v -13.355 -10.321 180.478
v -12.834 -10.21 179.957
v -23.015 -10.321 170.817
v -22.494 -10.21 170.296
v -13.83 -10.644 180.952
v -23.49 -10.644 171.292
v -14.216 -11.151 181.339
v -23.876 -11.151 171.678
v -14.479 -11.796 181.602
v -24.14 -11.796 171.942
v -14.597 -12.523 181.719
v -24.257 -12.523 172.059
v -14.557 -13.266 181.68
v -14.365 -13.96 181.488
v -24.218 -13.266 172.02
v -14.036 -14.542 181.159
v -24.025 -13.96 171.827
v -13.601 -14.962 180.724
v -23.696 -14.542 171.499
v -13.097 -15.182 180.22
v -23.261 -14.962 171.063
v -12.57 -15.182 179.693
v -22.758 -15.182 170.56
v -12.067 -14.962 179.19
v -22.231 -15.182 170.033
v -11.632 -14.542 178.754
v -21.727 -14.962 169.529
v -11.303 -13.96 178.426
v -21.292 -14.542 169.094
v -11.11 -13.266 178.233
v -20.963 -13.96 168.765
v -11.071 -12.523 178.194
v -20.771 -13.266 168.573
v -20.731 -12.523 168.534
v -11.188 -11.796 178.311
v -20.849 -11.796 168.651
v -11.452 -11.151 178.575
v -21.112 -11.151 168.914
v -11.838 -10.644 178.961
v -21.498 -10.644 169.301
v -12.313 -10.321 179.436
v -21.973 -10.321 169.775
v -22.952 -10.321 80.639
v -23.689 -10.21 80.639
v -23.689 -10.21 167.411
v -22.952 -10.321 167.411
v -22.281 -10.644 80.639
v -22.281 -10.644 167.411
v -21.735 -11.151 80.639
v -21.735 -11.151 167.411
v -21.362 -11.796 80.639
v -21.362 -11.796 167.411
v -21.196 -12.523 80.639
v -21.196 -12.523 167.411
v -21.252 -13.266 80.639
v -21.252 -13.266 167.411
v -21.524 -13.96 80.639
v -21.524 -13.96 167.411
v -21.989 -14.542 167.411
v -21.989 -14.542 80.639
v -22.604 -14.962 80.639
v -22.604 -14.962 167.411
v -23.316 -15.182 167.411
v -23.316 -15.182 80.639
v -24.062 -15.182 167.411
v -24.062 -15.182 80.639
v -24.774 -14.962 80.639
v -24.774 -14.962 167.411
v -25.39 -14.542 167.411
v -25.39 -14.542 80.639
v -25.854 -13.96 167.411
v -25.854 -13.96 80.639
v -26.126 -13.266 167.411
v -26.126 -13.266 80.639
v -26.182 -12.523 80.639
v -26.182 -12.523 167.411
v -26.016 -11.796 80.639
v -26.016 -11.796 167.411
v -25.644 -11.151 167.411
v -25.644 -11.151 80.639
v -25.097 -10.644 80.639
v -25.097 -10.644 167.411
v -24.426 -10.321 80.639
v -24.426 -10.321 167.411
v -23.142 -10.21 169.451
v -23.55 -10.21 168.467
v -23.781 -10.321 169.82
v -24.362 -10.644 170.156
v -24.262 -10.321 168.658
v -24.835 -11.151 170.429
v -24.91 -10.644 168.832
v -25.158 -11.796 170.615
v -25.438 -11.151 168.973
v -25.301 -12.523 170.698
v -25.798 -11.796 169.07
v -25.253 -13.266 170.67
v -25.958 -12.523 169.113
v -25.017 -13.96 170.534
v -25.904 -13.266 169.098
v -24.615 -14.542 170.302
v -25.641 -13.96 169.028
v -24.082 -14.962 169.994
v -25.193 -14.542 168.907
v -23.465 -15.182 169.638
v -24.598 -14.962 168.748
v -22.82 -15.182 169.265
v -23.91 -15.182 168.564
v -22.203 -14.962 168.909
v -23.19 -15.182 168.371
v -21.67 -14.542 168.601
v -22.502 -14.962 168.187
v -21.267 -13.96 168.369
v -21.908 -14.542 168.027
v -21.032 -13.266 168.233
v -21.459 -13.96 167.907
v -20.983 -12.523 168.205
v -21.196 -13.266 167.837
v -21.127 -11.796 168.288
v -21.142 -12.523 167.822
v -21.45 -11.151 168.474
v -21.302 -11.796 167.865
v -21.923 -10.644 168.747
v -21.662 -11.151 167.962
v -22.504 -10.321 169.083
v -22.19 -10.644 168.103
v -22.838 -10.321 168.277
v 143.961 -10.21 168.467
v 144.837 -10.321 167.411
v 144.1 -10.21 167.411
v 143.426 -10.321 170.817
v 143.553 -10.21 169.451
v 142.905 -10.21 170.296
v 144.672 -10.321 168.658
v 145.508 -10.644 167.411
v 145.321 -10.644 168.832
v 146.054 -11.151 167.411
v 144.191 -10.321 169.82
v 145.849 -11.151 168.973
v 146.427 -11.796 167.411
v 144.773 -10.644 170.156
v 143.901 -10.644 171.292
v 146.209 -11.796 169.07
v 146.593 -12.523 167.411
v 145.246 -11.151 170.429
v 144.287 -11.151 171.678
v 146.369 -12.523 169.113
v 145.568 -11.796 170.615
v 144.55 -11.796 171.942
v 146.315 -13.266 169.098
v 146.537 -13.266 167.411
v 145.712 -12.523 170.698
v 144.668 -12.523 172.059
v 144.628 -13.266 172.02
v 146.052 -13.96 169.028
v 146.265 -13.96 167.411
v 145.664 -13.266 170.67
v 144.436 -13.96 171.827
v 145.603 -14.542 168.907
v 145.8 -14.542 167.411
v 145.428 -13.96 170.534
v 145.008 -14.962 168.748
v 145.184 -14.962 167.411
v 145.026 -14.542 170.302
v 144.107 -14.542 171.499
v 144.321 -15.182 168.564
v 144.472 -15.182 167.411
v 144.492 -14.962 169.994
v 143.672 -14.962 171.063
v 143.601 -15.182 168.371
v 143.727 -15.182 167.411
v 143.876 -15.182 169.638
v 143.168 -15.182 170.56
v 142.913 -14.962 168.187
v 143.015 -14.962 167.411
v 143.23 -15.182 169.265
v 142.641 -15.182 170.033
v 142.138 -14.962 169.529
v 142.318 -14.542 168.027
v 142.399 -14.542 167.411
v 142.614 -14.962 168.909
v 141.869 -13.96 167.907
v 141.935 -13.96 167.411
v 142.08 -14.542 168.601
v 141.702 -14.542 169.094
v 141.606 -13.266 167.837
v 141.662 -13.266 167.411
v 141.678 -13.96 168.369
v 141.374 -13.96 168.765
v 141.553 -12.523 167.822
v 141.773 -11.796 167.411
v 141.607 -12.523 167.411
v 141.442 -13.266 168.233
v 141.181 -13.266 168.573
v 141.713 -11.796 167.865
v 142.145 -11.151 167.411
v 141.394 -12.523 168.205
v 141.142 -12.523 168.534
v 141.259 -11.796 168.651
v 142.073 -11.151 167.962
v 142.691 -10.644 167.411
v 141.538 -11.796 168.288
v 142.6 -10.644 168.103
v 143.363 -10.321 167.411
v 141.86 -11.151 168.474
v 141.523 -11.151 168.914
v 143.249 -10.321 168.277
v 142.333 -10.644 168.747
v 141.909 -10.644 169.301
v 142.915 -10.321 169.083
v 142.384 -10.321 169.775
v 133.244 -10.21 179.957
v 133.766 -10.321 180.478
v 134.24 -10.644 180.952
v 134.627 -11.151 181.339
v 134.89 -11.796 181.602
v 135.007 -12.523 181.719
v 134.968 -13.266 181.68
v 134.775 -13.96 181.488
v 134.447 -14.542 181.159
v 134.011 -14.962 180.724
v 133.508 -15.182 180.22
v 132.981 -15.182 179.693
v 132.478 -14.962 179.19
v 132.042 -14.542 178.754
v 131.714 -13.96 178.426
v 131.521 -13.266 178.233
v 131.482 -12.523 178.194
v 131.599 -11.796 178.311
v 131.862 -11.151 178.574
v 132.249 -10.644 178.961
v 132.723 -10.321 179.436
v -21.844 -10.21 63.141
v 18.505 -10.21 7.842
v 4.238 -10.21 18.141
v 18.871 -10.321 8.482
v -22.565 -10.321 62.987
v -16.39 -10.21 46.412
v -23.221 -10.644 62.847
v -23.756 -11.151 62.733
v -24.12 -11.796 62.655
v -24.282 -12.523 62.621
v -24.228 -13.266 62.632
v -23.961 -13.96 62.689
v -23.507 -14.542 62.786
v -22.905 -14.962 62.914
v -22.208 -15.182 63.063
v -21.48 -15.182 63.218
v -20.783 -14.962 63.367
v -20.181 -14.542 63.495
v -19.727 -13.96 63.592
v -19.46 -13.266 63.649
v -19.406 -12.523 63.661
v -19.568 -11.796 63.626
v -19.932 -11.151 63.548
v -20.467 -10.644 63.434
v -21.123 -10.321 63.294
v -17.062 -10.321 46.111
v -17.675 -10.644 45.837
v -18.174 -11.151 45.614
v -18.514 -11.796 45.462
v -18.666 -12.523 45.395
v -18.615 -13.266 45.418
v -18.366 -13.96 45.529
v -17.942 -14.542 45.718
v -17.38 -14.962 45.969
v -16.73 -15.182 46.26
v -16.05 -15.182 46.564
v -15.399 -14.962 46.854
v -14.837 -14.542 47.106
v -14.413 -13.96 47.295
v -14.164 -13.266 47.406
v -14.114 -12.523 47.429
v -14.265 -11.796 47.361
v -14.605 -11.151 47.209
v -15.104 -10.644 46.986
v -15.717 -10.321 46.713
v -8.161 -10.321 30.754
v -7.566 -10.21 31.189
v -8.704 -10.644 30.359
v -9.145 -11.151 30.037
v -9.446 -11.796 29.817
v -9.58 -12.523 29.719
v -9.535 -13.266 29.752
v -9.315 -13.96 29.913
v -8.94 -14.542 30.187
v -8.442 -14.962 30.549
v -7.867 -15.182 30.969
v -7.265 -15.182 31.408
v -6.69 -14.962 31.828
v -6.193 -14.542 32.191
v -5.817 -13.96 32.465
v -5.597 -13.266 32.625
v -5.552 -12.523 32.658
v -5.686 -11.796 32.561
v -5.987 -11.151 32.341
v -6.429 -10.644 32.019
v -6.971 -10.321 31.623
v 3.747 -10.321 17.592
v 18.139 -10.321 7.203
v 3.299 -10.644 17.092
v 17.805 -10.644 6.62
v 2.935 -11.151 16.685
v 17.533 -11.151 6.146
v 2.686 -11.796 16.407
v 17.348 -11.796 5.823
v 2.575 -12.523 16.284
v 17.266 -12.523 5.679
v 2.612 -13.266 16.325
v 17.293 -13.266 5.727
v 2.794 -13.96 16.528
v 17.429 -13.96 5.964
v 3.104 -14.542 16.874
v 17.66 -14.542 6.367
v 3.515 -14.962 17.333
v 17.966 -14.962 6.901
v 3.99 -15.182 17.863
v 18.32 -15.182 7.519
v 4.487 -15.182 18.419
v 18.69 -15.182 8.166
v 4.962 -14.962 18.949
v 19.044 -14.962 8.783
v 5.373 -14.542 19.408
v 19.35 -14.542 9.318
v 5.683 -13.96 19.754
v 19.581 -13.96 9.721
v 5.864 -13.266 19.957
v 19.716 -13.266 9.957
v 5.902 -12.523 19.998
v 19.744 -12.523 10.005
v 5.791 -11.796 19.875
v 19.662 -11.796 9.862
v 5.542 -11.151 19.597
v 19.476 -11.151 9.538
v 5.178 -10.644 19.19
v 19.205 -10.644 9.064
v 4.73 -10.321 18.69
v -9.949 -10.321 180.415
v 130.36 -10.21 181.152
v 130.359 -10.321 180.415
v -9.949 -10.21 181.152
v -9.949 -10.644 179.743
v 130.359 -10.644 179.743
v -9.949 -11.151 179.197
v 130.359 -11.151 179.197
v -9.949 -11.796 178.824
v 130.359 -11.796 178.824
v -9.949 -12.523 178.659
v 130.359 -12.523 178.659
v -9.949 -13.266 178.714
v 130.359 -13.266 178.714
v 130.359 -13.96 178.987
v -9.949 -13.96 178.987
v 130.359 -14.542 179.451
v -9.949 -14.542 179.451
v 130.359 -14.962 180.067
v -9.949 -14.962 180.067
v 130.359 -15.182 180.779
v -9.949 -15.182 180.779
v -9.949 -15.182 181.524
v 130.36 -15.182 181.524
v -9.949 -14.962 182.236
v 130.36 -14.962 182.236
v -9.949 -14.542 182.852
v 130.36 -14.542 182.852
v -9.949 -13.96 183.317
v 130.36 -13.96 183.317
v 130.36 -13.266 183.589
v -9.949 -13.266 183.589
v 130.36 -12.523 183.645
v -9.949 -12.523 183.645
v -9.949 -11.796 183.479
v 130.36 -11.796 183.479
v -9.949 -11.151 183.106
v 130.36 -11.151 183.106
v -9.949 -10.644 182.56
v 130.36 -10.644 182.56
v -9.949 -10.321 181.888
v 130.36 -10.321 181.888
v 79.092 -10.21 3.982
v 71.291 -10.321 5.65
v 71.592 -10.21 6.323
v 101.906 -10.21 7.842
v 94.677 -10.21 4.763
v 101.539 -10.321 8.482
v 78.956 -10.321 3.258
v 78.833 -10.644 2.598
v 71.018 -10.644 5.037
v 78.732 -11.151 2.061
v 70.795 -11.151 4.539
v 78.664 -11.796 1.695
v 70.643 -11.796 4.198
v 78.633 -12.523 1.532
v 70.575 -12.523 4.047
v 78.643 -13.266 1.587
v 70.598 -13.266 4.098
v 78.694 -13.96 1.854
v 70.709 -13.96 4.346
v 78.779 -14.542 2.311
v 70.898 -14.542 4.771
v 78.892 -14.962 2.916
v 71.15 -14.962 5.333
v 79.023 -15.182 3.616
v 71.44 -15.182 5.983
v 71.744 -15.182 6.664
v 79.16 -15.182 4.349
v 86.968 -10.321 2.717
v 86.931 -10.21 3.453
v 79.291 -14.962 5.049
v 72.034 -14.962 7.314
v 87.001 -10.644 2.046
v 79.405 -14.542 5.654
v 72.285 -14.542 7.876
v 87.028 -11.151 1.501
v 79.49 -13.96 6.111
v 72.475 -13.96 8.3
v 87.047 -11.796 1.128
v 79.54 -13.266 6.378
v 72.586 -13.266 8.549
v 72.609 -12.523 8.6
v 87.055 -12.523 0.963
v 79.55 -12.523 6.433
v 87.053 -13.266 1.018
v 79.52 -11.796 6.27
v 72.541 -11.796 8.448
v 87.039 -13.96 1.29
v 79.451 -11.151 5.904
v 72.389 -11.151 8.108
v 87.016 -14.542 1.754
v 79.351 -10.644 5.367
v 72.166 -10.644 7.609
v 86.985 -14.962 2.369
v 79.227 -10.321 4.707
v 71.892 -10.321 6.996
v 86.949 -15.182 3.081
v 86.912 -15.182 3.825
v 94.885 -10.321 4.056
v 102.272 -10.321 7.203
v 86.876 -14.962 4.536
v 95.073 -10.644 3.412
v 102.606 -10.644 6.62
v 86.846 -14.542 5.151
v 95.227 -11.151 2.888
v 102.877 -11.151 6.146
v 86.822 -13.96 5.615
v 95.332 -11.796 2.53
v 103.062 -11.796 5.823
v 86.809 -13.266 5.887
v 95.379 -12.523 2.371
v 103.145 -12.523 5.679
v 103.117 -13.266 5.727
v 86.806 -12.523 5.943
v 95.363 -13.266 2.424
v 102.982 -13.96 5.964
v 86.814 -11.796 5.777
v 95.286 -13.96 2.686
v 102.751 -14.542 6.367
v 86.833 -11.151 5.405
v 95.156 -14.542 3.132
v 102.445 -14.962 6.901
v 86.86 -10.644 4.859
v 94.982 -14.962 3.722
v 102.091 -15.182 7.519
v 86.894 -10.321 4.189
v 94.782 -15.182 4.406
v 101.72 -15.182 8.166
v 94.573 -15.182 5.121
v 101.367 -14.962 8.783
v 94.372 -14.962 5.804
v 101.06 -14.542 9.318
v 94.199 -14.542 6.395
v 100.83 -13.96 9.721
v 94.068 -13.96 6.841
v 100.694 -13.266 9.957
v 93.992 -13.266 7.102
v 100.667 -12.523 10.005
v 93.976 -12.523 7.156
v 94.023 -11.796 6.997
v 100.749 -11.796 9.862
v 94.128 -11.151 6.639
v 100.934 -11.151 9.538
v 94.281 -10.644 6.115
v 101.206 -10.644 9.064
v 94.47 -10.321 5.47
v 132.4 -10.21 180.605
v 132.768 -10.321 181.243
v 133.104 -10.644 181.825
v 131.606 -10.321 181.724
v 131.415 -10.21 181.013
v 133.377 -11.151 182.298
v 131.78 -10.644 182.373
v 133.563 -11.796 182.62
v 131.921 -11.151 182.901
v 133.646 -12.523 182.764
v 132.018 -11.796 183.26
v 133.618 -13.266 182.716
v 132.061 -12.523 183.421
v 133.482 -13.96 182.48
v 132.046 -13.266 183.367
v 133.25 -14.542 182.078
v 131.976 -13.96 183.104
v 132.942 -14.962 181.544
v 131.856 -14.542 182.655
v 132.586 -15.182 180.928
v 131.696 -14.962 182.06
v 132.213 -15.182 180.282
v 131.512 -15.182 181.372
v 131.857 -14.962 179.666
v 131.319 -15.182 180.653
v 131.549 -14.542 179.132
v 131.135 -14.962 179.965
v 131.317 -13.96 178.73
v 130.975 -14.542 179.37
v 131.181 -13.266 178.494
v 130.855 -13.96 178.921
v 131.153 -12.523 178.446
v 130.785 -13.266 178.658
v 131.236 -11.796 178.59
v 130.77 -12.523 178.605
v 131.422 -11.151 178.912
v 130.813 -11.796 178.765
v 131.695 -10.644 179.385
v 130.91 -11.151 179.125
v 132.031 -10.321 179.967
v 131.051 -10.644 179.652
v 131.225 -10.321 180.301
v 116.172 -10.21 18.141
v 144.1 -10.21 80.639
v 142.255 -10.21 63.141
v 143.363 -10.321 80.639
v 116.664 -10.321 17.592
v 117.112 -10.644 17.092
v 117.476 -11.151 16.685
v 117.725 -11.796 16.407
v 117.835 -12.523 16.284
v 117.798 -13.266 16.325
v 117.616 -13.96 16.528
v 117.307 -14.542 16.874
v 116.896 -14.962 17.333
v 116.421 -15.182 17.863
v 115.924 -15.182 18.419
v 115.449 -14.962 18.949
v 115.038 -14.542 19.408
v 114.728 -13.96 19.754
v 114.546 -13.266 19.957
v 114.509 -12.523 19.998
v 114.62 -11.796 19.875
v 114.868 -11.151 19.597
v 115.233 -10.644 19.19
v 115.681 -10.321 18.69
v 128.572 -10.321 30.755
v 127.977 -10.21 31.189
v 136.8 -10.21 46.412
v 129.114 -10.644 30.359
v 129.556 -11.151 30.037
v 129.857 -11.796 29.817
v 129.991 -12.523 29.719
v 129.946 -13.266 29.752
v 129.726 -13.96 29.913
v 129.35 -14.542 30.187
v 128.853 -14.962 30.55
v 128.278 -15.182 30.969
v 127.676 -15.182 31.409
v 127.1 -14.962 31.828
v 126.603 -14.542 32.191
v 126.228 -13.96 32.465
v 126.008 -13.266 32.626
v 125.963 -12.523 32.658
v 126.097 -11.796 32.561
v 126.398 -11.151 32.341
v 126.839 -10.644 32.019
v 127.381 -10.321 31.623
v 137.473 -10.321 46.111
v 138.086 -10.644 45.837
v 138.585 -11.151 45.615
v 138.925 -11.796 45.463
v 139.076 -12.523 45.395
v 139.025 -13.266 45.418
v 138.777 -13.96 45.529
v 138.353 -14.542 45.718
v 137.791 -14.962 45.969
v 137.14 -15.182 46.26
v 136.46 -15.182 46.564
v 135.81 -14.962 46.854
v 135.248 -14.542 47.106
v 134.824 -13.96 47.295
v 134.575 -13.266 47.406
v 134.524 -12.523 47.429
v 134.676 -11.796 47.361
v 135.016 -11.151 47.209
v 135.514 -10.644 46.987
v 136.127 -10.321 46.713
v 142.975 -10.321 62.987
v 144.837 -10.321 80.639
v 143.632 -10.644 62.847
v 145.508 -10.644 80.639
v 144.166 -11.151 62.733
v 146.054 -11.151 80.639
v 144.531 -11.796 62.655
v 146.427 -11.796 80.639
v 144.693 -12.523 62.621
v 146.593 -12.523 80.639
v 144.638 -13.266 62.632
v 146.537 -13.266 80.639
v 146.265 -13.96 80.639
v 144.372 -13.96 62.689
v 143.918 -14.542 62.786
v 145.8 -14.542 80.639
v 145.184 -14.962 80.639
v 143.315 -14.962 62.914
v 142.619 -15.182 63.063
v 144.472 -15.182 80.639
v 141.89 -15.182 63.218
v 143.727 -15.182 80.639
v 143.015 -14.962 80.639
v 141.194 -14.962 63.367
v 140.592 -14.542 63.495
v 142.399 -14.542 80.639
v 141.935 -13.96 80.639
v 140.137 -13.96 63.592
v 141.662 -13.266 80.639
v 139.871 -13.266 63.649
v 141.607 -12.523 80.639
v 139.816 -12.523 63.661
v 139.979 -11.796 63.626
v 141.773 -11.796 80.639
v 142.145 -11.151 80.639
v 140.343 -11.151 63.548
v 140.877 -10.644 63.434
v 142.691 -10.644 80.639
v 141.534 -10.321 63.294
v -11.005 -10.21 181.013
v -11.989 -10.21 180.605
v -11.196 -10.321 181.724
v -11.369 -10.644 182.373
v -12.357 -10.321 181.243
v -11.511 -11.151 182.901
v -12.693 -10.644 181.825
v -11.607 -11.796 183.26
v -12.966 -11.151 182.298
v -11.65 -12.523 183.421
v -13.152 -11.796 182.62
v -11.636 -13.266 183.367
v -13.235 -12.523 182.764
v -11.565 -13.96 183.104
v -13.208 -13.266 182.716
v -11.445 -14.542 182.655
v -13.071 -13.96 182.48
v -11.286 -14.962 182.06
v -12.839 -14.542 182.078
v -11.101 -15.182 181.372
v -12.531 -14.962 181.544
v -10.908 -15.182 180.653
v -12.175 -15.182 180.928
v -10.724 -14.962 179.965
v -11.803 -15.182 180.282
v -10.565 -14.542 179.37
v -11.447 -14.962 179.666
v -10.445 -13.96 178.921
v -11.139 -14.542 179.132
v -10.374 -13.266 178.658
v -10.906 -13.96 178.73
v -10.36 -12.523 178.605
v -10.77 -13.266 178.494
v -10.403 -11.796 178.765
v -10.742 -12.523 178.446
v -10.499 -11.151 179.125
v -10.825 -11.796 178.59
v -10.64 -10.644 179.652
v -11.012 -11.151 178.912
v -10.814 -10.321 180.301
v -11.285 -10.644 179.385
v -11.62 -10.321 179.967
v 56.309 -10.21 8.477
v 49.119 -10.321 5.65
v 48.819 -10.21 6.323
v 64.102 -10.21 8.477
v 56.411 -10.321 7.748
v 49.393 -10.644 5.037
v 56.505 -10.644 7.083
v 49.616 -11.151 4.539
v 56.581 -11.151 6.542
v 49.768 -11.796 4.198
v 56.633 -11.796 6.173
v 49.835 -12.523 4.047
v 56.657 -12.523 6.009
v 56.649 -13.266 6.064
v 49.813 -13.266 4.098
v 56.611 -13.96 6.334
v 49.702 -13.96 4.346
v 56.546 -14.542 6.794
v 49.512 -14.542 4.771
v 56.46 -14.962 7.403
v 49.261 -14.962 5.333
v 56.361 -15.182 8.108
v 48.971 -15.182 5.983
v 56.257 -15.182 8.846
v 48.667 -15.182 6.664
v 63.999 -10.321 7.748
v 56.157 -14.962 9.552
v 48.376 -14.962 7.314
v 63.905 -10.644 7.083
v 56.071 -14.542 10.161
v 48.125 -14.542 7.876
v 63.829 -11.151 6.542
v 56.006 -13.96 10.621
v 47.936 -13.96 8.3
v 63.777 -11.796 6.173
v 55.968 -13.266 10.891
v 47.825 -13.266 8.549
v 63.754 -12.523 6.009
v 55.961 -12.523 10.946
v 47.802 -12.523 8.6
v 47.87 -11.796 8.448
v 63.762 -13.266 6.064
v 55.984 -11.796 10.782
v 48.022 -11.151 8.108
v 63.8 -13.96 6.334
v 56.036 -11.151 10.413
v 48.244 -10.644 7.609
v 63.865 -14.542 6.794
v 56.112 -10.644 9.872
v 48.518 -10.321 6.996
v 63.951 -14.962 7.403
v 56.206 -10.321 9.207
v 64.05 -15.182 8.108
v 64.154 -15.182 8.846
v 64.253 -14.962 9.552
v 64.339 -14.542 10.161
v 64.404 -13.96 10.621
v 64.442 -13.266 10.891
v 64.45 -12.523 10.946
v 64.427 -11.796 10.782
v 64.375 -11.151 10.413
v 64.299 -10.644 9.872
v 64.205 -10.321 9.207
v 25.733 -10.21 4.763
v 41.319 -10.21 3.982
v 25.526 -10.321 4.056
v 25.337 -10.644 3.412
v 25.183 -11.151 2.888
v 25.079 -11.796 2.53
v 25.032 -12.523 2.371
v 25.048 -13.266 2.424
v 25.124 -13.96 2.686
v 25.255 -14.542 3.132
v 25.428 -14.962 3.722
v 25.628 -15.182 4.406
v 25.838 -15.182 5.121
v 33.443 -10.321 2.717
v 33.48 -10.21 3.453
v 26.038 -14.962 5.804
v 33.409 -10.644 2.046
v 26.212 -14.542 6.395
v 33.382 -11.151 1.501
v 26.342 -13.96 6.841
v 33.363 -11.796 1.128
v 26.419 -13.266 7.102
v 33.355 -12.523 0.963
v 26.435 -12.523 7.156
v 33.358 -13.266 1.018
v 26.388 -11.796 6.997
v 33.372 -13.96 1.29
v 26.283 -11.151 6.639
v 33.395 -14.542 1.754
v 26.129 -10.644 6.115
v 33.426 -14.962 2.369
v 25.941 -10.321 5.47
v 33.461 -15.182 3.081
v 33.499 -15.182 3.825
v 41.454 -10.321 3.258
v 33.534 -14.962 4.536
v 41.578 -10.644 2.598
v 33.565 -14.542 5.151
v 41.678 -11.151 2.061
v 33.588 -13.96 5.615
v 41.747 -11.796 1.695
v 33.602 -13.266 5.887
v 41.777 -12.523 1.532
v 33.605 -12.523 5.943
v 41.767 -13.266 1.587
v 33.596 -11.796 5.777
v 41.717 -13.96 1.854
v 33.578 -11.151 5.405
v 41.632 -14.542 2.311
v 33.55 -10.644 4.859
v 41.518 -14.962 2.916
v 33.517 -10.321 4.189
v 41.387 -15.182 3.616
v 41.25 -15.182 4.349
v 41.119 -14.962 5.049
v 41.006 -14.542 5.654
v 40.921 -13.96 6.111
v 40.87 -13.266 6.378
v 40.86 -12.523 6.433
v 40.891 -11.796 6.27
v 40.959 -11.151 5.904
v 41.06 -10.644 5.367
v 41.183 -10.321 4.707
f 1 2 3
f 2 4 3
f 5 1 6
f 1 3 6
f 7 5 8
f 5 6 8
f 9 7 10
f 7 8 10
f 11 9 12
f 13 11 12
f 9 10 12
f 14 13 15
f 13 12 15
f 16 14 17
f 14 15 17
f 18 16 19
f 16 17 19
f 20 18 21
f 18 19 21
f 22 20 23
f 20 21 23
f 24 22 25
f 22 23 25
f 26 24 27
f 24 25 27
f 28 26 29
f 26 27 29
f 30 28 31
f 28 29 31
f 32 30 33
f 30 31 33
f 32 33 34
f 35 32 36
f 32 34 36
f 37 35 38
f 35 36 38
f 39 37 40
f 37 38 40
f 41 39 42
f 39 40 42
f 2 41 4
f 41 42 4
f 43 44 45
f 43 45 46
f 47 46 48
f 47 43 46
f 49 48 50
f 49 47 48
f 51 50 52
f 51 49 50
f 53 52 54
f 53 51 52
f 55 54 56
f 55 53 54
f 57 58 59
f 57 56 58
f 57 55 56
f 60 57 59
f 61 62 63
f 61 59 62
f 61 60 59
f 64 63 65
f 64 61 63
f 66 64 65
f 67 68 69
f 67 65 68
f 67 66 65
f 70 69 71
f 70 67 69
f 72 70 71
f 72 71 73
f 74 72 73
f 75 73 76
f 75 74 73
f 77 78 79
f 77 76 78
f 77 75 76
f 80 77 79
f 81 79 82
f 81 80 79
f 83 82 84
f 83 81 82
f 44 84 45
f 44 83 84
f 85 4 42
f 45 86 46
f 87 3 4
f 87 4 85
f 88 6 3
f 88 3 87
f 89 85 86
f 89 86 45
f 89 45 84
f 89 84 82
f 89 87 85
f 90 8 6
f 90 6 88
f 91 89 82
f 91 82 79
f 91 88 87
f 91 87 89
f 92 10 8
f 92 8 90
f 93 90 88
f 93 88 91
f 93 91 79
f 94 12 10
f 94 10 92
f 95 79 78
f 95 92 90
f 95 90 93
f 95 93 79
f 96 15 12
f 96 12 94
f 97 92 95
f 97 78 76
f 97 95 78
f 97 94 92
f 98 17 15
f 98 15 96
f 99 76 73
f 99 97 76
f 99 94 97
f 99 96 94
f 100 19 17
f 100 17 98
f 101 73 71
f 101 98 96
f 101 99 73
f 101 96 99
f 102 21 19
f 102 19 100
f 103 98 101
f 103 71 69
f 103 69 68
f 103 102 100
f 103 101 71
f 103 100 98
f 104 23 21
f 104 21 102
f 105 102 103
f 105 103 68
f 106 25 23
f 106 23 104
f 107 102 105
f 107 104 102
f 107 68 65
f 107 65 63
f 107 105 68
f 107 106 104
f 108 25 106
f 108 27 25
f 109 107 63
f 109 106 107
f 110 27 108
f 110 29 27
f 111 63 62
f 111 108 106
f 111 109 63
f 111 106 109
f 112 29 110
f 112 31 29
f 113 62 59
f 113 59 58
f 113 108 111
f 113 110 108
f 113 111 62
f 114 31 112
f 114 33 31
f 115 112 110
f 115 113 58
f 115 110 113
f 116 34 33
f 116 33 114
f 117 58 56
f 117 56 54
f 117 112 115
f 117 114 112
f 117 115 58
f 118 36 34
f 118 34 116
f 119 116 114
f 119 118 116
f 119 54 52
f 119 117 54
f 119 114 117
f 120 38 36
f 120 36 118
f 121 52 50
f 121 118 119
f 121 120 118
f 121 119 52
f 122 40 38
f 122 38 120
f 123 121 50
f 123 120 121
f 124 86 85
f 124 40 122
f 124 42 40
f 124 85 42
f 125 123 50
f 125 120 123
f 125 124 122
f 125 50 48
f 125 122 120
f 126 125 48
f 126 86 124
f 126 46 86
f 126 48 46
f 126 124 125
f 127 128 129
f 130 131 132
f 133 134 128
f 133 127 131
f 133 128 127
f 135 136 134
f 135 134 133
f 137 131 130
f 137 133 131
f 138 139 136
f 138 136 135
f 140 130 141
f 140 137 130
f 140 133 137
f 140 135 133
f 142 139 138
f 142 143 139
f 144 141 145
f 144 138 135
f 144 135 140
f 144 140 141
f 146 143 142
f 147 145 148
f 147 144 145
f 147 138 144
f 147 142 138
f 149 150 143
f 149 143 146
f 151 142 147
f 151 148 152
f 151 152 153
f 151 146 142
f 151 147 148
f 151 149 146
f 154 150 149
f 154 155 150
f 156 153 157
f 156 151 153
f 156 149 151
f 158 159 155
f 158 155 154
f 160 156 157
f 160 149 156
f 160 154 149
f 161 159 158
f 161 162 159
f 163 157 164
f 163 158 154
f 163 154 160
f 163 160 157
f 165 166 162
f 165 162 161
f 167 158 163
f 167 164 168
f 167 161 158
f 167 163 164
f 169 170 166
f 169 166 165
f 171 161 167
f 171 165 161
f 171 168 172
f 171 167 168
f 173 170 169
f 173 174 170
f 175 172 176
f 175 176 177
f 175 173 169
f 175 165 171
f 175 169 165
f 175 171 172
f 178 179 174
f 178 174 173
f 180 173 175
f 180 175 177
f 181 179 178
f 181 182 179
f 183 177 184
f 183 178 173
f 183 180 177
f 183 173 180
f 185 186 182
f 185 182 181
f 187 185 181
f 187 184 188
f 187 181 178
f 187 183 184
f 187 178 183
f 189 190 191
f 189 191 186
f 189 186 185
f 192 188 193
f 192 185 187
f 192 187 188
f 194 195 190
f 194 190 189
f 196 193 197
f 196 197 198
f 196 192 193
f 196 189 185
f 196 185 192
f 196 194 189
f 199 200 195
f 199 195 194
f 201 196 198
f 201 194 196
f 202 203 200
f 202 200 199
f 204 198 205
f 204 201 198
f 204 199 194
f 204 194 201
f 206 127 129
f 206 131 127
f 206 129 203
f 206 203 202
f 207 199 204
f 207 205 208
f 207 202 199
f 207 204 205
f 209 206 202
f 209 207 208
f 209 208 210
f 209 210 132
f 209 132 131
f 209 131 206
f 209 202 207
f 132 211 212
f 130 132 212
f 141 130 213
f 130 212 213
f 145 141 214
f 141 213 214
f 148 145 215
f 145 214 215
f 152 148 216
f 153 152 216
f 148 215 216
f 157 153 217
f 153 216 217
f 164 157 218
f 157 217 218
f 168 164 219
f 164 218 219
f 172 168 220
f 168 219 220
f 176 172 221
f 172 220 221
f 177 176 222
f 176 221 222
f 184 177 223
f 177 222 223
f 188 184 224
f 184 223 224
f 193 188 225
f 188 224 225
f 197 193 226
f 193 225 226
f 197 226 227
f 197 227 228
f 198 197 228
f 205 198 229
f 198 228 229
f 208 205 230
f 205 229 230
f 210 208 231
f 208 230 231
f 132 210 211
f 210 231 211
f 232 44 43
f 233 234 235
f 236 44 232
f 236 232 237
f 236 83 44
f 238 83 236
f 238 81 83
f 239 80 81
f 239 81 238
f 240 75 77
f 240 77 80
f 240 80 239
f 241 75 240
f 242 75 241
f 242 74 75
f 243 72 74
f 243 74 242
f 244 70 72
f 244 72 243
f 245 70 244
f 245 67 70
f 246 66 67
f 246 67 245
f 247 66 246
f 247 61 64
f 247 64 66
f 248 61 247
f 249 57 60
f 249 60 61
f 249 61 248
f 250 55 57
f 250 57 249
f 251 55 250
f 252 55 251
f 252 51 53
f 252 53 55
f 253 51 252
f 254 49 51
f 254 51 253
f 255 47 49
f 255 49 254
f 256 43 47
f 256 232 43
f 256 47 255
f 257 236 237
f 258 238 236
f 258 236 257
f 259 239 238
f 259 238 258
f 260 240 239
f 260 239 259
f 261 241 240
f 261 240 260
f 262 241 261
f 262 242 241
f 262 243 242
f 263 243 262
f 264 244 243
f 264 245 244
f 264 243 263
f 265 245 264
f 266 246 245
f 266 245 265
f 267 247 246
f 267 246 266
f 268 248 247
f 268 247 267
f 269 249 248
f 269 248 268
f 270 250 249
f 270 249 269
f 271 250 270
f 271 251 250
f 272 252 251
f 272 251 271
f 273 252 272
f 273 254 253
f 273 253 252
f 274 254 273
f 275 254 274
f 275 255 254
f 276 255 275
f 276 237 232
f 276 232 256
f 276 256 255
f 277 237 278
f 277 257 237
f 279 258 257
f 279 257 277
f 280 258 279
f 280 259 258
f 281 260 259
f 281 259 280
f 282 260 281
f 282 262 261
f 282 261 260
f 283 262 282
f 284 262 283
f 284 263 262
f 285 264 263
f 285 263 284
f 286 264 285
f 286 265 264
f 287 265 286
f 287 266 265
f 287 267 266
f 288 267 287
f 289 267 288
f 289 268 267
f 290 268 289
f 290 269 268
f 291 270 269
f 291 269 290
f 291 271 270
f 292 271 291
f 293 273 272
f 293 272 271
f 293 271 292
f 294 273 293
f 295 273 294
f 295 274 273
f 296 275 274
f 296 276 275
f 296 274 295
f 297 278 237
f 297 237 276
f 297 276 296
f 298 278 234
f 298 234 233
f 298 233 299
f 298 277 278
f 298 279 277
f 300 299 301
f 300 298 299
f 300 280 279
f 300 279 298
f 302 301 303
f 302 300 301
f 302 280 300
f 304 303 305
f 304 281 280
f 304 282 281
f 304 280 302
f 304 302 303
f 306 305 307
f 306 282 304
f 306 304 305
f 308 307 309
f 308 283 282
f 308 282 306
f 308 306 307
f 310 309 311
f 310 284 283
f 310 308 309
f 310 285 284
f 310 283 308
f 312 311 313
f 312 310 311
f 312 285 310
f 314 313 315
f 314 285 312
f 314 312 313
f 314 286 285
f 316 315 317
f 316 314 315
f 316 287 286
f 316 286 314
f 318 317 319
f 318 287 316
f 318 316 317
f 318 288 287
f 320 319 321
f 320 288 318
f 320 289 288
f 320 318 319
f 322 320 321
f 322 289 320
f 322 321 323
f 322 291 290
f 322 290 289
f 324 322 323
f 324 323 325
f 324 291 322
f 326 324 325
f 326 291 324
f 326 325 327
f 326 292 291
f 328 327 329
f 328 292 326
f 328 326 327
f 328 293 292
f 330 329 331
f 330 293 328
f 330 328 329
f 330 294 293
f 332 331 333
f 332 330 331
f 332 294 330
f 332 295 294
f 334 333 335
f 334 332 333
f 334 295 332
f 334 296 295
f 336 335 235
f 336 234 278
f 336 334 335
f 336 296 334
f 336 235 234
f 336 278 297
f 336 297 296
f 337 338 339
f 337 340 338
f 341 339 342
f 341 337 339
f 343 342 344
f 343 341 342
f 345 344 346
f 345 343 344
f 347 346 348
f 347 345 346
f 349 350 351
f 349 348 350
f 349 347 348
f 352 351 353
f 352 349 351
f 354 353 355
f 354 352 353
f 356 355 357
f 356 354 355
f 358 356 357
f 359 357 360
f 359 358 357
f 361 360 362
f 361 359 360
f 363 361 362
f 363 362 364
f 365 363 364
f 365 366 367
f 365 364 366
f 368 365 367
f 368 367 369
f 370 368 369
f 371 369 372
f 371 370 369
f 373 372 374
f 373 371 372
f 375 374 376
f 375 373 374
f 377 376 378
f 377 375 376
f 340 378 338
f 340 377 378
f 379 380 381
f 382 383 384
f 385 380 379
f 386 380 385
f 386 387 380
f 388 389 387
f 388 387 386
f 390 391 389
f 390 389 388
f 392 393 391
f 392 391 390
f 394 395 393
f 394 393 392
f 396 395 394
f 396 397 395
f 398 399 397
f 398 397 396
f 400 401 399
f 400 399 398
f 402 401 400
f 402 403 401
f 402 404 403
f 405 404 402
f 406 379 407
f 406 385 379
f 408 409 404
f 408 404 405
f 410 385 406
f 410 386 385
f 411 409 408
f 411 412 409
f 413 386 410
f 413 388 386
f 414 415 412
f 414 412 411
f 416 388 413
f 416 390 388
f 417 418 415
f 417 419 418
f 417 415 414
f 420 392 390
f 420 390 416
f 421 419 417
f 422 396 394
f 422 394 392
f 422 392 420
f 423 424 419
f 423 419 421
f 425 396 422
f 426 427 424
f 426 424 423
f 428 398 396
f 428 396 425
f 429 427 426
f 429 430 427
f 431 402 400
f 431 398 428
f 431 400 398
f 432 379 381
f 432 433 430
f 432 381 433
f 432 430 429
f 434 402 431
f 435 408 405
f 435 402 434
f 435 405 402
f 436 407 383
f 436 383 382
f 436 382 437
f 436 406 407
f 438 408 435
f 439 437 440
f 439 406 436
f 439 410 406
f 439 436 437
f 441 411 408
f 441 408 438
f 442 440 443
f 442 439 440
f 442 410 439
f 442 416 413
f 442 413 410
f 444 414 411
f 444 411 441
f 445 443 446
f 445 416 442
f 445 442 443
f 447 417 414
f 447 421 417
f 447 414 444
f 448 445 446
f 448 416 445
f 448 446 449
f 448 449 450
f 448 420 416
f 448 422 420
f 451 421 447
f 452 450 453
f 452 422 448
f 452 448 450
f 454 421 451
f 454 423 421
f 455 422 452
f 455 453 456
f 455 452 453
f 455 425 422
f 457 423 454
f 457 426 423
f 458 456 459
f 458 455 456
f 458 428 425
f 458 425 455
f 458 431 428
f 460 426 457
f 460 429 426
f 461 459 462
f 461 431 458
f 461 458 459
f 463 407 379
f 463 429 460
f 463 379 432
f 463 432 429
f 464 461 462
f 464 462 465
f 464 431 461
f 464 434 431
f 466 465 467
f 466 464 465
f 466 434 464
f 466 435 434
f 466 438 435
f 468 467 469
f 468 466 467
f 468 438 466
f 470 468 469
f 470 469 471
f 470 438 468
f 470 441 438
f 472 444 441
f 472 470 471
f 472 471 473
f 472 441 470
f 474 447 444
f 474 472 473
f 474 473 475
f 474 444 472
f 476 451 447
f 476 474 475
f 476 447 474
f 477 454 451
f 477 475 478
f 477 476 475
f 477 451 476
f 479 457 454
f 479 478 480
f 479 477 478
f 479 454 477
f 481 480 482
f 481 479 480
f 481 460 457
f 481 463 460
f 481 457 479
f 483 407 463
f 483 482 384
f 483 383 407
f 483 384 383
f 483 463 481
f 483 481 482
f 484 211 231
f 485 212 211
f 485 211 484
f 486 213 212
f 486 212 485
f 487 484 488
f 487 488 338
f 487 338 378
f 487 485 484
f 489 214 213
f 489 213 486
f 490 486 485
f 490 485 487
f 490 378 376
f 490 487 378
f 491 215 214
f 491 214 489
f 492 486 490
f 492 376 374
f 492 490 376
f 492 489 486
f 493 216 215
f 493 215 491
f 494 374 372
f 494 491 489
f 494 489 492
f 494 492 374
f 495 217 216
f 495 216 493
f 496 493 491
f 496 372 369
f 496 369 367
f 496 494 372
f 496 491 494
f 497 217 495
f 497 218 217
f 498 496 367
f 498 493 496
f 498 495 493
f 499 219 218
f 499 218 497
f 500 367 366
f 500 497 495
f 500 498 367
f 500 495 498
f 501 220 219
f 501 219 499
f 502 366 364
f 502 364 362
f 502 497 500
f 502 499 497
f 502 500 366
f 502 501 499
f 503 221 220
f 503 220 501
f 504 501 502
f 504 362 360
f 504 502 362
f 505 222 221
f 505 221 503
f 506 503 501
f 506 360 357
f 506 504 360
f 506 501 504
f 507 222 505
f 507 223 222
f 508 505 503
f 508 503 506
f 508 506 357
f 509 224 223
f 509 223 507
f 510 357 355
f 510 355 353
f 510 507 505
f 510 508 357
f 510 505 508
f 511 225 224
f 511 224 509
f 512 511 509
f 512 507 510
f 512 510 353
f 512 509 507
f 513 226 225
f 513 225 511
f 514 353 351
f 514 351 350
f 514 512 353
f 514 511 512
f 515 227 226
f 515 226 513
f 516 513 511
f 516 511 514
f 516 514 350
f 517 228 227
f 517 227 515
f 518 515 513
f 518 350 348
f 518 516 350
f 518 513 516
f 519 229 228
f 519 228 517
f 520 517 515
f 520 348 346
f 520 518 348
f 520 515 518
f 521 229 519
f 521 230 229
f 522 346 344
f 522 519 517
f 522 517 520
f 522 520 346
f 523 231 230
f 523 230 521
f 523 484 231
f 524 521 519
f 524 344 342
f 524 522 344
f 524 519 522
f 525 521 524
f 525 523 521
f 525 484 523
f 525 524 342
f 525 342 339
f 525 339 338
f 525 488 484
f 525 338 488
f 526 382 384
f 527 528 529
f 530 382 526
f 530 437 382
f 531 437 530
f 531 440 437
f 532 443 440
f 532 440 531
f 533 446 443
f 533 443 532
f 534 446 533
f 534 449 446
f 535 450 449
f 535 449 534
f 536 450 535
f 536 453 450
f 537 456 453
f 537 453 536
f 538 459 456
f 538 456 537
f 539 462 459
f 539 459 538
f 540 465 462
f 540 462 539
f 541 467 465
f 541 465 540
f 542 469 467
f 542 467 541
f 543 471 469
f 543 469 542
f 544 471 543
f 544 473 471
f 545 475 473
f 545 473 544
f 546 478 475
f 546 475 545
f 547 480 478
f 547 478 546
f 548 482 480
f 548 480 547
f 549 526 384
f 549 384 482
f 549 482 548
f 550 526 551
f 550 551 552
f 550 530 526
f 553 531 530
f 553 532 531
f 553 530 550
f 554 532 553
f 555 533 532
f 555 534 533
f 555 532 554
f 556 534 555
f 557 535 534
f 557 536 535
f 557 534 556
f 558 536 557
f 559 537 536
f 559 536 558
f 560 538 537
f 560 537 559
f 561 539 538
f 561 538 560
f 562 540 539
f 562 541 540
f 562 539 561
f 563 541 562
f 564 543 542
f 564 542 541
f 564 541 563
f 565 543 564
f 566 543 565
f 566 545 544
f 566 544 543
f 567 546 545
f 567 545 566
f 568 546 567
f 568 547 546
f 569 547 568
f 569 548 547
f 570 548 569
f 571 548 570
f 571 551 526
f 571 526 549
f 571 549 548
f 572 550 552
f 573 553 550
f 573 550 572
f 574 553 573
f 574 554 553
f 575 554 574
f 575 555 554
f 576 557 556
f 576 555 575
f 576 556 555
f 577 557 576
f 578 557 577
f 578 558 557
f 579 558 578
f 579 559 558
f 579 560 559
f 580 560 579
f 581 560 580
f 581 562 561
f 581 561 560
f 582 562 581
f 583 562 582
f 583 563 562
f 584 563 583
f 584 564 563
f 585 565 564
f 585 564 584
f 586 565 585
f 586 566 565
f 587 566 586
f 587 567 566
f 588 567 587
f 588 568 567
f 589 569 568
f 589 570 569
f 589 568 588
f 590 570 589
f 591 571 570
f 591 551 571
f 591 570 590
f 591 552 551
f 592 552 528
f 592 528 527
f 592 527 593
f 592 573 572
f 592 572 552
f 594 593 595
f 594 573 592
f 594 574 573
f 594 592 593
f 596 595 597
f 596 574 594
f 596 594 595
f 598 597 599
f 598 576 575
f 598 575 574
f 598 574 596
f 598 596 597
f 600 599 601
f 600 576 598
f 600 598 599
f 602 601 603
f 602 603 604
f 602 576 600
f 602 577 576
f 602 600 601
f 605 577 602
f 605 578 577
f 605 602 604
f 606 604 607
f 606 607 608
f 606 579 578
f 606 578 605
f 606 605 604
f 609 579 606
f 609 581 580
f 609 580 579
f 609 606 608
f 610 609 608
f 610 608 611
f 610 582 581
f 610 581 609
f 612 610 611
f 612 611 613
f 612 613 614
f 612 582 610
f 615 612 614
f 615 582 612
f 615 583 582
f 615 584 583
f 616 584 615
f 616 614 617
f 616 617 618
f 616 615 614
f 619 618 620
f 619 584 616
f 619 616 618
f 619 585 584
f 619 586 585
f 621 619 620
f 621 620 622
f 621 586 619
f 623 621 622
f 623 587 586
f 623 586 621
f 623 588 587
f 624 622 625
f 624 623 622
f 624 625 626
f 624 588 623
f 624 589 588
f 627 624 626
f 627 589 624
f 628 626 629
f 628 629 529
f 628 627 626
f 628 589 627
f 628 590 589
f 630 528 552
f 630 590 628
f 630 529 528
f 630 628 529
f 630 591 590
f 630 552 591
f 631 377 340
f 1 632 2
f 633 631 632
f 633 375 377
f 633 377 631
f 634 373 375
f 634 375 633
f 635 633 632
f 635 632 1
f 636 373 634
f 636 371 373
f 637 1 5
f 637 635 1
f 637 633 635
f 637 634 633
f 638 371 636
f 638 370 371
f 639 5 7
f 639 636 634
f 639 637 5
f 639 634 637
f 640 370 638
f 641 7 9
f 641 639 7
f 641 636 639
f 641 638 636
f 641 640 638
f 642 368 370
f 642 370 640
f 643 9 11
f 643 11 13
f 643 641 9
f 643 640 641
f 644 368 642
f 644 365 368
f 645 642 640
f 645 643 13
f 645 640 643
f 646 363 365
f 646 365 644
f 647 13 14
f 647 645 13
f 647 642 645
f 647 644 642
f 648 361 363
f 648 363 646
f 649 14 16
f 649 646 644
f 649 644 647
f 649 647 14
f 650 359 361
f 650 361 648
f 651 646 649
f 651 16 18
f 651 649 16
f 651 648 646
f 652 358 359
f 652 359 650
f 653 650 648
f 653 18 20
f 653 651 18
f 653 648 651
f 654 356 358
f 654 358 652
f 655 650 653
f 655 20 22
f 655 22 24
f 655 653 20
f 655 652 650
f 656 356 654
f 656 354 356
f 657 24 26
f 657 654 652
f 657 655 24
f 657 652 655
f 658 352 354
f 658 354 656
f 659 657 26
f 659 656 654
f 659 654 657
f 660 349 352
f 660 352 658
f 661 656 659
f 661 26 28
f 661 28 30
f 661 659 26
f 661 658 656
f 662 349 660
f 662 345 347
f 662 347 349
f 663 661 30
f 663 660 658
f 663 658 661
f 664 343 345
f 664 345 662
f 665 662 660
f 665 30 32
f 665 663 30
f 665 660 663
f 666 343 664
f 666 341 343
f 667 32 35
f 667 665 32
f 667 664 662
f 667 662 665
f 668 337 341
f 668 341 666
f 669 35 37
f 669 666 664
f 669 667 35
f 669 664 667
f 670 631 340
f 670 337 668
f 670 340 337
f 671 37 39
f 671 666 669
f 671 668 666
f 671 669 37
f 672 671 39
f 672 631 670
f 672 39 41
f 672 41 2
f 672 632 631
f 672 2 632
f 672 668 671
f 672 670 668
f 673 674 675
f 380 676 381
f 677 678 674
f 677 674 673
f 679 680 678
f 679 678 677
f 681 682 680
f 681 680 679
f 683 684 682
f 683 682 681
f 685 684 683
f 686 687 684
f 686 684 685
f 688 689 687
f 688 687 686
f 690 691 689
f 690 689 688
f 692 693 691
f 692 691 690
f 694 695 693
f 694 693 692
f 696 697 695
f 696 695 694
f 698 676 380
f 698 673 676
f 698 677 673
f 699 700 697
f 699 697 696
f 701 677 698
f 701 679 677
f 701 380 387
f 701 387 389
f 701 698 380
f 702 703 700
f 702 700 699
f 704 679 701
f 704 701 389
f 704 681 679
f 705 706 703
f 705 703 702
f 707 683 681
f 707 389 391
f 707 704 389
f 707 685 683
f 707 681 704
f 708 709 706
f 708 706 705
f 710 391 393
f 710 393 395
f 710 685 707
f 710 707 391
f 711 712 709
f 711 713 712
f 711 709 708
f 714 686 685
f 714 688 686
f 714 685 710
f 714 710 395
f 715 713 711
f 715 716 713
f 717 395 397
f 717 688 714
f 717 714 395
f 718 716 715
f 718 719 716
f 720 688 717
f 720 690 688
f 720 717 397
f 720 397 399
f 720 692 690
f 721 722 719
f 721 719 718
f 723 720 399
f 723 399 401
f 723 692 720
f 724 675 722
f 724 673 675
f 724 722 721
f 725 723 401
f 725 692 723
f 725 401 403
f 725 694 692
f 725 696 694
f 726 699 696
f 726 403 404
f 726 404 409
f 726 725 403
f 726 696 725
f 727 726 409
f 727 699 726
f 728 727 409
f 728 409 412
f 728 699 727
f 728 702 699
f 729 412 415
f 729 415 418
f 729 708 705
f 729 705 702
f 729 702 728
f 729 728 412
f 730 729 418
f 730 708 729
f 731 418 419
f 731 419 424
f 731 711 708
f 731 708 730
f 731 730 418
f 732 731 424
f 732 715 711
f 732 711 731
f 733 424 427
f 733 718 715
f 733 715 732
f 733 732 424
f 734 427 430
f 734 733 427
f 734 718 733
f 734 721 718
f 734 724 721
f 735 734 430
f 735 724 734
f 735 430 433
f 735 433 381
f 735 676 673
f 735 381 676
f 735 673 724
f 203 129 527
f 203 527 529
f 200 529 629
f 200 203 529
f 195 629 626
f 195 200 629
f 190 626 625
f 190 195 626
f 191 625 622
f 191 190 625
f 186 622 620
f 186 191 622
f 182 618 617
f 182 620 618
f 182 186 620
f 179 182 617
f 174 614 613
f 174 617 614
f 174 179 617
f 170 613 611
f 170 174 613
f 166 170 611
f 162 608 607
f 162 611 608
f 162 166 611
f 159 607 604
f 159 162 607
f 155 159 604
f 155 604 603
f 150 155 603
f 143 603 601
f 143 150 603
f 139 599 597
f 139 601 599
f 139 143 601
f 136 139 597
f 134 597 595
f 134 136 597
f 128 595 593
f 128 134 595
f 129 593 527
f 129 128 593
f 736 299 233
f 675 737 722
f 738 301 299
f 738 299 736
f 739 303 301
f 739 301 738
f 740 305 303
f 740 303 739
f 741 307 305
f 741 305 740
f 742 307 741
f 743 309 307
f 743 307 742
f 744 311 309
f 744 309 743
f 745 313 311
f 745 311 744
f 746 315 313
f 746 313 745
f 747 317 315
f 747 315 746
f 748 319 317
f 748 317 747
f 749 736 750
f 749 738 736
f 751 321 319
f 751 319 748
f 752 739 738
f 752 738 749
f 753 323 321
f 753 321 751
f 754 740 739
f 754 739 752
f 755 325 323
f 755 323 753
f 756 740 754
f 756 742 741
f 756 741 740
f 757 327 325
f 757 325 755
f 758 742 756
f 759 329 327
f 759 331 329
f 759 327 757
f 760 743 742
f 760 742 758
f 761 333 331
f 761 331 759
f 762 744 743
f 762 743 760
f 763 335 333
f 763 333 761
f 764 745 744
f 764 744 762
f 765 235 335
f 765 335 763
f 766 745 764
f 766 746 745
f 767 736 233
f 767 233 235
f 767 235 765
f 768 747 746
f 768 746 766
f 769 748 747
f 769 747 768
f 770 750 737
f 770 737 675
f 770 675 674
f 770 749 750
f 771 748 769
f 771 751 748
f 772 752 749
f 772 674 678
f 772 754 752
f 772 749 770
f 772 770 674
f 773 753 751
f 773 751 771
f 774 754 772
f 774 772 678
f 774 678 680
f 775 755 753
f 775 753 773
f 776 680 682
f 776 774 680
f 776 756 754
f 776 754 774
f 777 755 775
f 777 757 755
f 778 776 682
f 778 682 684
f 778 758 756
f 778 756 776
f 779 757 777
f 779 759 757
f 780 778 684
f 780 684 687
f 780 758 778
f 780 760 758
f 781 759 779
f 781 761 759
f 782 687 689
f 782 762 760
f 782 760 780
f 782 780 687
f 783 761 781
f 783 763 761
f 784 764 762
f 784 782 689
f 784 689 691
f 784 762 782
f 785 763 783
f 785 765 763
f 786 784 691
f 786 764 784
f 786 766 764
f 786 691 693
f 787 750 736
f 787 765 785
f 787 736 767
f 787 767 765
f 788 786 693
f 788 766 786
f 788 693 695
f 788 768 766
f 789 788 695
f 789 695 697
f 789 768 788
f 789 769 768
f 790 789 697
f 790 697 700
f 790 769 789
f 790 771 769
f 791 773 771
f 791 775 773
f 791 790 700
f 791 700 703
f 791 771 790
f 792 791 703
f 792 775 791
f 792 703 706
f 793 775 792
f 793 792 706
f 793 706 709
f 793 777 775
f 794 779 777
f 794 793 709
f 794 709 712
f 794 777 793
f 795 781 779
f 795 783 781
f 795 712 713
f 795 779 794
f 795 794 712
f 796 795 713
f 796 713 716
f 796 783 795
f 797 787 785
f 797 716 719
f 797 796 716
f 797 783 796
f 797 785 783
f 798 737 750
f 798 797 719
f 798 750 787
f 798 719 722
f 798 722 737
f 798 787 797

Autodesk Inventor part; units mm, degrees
ref_plane "YZ Plane" through (0, 0, 0) normal (1, 0, 0) x (0, 1, 0)
ref_plane "XZ Plane" through (0, 0, 0) normal (0, 1, 0) x (-1, 0, 0)
ref_plane "Work Plane1" through (60.2053, -12.7096, 92.2812) normal (0, 1, 0) x (-1, 0, 0)
sketch "Sketch1" plane through (60.2053, -12.7096, 92.2812) normal (0, 1, 0) x (-1, 0, 0)
  arc A0 (-40.6666, -82.6341) -> (-12.2349, -84.0587) centre (-25.049, -55.3704) ccw construction
  arc A1 (12.2349, -84.0587) -> (-12.2349, -84.0587) centre (0, -111.4504) ccw construction
  arc A2 (12.2349, -84.0587) -> (40.6666, -82.6341) centre (25.049, -55.3704) ccw construction
  arc A3 (40.6666, -82.6341) -> (81.8144, -11.6423) centre (0, -11.6423) ccw construction
  line L0 (81.8144, -11.6423) -> (81.8144, 75.1302) construction
  arc A4 (81.8144, 75.1302) -> (81.2286, 76.5444) centre (79.8144, 75.1302) ccw construction
  line L1 (81.2286, 76.5444) -> (71.5684, 86.2046) construction
  arc A5 (71.5684, 86.2046) -> (70.1542, 86.7904) centre (70.1542, 84.7904) ccw construction
  line L2 (70.1542, 86.7904) -> (-70.1542, 86.7904) construction
  arc A6 (-70.1542, 86.7904) -> (-71.5684, 86.2046) centre (-70.1542, 84.7904) ccw construction
  line L3 (-71.5684, 86.2046) -> (-81.2286, 76.5444) construction
  arc A7 (-81.2286, 76.5444) -> (-81.8144, 75.1302) centre (-79.8144, 75.1302) ccw construction
  line L4 (-81.8144, 75.1302) -> (-81.8144, -11.6423) construction
  arc A8 (-81.8144, -11.6423) -> (-40.6666, -82.6341) centre (0, -11.6423) ccw construction
  arc A9 (10, -81.3229) -> (-10, -81.3229) centre (0, -11.6423) ccw construction
  arc A10 (-39.9607, -81.4019) -> (-10, -81.3229) centre (-25.049, -55.3704) ccw construction
  arc A11 (-80.3944, -11.6423) -> (-39.9607, -81.4019) centre (0, -11.6423) ccw construction
  line L5 (-80.3944, 75.3704) -> (-80.3944, -11.6423) construction
  line L6 (-70.3944, 85.3704) -> (-80.3944, 75.3704) construction
  line L7 (70.3944, 85.3704) -> (-70.3944, 85.3704) construction
  line L8 (80.3944, 75.3704) -> (70.3944, 85.3704) construction
  line L9 (80.3944, -11.6423) -> (80.3944, 75.3704) construction
  arc A12 (39.9607, -81.4019) -> (80.3944, -11.6423) centre (0, -11.6423) ccw construction
  arc A13 (10, -81.3229) -> (39.9607, -81.4019) centre (25.049, -55.3704) ccw construction
  circle A14 centre (0, -11.6423) radius 68.3944 construction
  arc A15 (-87.3944, -11.6423) -> (87.3944, -11.6423) centre (0, -11.6423) ccw construction
  line L10 (87.3944, 88.3704) -> (87.3944, -11.6423) construction
  arc A16 (87.3944, 88.3704) -> (83.3944, 92.3704) centre (83.3944, 88.3704) ccw construction
  line L11 (-83.3944, 92.3704) -> (83.3944, 92.3704) construction
  arc A17 (-83.3944, 92.3704) -> (-87.3944, 88.3704) centre (-83.3944, 88.3704) ccw construction
  line L12 (-87.3944, -11.6423) -> (-87.3944, 88.3704) construction
  circle A18 centre (0, -95.5368) radius 1.85 construction
  circle A19 centre (-83.3944, 88.3704) radius 1.85 construction
  circle A20 centre (83.3944, 88.3704) radius 1.85 construction
  arc A21 (-85.9744, -11.6423) -> (-42.7343, -86.2438) centre (0, -11.6423) ccw construction
  line L13 (-85.9744, -11.6423) -> (-85.9744, 75.1302) construction
  arc A22 (-84.1702, 79.486) -> (-85.9744, 75.1302) centre (-79.8144, 75.1302) ccw construction
  line L14 (-84.1702, 79.486) -> (-74.51, 89.1462) construction
  arc A23 (-70.1542, 90.9504) -> (-74.51, 89.1462) centre (-70.1542, 84.7904) ccw construction
  line L15 (-70.1542, 90.9504) -> (70.1542, 90.9504) construction
  arc A24 (74.51, 89.1462) -> (70.1542, 90.9504) centre (70.1542, 84.7904) ccw construction
  line L16 (74.51, 89.1462) -> (84.1702, 79.486) construction
  arc A25 (85.9744, 75.1302) -> (84.1702, 79.486) centre (79.8144, 75.1302) ccw construction
  line L17 (85.9744, 75.1302) -> (85.9744, -11.6423) construction
  arc A26 (42.7343, -86.2438) -> (85.9744, -11.6423) centre (0, -11.6423) ccw construction
  arc A27 (10.5384, -87.857) -> (42.7343, -86.2438) centre (25.049, -55.3704) ccw construction
  arc A28 (10.5384, -87.857) -> (-10.5384, -87.857) centre (0, -111.4504) ccw construction
  arc A29 (-42.7343, -86.2438) -> (-10.5384, -87.857) centre (-25.049, -55.3704) ccw construction
  line L18 (-83.8944, -11.6423) -> (-83.8944, 75.1302)
  arc A30 (-82.6994, 78.0152) -> (-83.8944, 75.1302) centre (-79.8144, 75.1302) ccw
  line L19 (-82.6994, 78.0152) -> (-73.0392, 87.6754)
  arc A31 (-70.1542, 88.8704) -> (-73.0392, 87.6754) centre (-70.1542, 84.7904) ccw
  line L20 (-70.1542, 88.8704) -> (70.1542, 88.8704)
  arc A32 (73.0392, 87.6754) -> (70.1542, 88.8704) centre (70.1542, 84.7904) ccw
  line L21 (73.0392, 87.6754) -> (82.6994, 78.0152)
  arc A33 (83.8944, 75.1302) -> (82.6994, 78.0152) centre (79.8144, 75.1302) ccw
  line L22 (83.8944, 75.1302) -> (83.8944, -11.6423)
  arc A34 (41.7004, -84.439) -> (83.8944, -11.6423) centre (0, -11.6423) ccw
  arc A35 (11.3866, -85.9579) -> (41.7004, -84.439) centre (25.049, -55.3704) ccw
  arc A36 (11.3866, -85.9579) -> (-11.3866, -85.9579) centre (0, -111.4504) ccw
  arc A37 (-41.7004, -84.439) -> (-11.3866, -85.9579) centre (-25.049, -55.3704) ccw
  arc A38 (-83.8944, -11.6423) -> (-41.7004, -84.439) centre (0, -11.6423) ccw
  point P0 (60.2053, -92.2812)
  dimension "d0" = 2.08
sketch "Sketch2" plane through (0, 0, 0) normal (1, 0, 0) x (0, 1, 0)
  circle A0 centre (-12.7096, 181.1516) radius 2.5
  point P0 (0, 0)
  dimension "d1" = 5
sweep "Sweep1" add profiles "Sketch2" path "Sketch1"
properties part number "middle_gasket" material "Rubber, Black"
